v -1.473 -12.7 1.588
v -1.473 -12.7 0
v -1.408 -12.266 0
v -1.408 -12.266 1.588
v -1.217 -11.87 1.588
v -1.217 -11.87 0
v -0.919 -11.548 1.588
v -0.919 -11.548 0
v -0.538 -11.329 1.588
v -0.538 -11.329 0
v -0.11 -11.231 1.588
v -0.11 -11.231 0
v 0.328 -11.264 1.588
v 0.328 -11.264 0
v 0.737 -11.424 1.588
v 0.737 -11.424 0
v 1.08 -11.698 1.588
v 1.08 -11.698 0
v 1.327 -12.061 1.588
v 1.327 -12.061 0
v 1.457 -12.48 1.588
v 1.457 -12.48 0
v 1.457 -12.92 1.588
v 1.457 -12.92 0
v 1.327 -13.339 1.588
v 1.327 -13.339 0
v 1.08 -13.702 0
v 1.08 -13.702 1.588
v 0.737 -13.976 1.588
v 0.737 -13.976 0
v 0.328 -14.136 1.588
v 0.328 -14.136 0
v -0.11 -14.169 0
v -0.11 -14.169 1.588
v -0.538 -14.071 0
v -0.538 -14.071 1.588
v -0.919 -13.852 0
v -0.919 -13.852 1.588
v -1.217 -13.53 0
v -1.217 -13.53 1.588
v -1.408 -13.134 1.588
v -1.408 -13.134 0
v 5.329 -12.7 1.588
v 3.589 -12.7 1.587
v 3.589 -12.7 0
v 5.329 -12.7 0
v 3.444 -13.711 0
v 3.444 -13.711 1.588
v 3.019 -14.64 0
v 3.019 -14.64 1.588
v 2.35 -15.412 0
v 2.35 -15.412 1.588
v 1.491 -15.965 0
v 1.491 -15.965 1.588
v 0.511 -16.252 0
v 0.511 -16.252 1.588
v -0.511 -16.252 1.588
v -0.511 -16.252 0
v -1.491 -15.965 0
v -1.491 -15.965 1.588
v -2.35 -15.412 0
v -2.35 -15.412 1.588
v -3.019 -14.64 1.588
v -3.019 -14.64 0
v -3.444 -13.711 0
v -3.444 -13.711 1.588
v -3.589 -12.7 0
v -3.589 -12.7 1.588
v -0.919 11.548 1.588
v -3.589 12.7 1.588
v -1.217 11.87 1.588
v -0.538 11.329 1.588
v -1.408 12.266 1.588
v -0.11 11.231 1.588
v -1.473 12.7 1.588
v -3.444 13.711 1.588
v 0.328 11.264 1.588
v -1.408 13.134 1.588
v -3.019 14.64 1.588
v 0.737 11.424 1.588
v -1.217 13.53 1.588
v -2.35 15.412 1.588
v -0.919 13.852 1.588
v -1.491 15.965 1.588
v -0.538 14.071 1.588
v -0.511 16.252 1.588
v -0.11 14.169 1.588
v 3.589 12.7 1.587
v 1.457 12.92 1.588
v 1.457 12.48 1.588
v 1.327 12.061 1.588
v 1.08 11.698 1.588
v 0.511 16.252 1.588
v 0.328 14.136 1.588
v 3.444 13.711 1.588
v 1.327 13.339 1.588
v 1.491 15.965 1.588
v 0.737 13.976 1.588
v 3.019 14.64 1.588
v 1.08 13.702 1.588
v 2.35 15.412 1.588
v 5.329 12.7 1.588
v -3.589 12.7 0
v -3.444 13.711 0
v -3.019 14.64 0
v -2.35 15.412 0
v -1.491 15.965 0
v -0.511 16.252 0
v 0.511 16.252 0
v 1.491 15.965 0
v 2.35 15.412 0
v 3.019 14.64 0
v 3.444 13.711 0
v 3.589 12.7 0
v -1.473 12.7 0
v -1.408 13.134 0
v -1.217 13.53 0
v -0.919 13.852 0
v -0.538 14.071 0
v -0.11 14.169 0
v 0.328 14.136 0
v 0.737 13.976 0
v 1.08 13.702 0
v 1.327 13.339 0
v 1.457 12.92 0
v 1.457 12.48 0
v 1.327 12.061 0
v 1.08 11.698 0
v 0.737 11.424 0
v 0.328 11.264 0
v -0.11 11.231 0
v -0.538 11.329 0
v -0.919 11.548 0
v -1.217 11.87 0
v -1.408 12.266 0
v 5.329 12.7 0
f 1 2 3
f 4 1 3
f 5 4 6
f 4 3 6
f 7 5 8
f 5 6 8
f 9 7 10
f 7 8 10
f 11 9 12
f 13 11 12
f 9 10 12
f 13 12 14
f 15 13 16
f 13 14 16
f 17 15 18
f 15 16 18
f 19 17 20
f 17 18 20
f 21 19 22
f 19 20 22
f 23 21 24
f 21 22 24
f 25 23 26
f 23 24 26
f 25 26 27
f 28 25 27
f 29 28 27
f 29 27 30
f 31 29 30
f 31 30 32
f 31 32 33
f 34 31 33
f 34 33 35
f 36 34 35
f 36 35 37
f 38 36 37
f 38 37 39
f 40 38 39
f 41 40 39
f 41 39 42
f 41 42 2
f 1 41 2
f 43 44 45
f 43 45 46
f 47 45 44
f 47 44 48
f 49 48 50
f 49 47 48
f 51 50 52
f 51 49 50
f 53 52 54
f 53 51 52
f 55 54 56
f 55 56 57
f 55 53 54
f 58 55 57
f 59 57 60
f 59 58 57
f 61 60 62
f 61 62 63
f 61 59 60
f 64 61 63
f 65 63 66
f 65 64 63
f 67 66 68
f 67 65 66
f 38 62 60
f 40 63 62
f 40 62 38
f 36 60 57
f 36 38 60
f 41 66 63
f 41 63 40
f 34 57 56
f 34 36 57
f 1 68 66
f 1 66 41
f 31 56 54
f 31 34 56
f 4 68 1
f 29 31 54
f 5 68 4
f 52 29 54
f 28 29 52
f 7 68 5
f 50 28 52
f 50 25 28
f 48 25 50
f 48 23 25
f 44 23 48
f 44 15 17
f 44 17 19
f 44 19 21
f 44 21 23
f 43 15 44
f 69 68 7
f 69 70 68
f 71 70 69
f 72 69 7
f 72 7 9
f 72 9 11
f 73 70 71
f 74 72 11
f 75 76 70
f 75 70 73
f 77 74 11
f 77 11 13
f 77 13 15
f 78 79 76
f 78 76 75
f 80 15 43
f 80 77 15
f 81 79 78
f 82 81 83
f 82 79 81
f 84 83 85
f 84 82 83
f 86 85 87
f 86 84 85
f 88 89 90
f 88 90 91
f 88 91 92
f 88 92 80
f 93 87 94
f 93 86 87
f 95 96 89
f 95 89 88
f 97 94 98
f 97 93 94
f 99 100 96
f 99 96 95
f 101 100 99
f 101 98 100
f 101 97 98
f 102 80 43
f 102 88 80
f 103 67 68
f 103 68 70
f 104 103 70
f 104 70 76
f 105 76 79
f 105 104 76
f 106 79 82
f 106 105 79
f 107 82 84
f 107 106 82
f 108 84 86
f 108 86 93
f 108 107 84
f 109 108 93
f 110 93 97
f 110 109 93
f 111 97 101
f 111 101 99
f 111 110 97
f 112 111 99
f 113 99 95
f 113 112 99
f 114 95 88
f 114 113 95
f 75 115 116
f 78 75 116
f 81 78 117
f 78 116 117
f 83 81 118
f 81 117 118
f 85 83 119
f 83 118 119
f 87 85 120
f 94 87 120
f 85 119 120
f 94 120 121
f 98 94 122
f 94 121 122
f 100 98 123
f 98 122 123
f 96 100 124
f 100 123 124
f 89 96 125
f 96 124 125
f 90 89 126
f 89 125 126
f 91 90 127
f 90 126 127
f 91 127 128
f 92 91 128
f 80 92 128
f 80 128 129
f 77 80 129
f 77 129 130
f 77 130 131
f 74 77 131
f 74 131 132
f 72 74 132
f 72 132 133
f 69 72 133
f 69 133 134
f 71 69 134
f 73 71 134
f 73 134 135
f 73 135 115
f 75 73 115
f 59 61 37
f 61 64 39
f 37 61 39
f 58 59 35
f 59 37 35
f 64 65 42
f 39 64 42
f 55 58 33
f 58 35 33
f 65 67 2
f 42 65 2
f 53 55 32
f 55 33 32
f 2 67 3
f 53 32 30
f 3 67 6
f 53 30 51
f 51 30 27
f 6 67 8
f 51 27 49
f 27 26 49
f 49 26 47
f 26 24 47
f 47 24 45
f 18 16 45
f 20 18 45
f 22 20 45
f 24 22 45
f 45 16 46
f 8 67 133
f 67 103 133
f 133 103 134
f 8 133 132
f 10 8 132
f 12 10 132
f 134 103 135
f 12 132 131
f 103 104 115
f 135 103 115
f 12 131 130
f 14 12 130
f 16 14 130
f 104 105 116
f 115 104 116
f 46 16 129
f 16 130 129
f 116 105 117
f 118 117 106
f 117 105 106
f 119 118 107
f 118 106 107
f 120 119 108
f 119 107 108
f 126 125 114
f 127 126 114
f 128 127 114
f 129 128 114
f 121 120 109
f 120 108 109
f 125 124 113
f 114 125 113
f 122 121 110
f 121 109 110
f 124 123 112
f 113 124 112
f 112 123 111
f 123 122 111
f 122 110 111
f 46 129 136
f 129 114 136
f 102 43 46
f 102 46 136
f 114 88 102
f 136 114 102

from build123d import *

# Parameters (mm, degrees)
BOSS_EXTRUDE1_DEPTH       = 1.5875
F_4_CLEARANCE_HOLE1_D     = 2.9464
F_4_CLEARANCE_HOLE1_DEPTH = 3.302
F_4_CLEARANCE_HOLE1_TIP   = 0.885187864
SKETCH5_W                 = 1.7399
SKETCH5_H                 = 25.4
BOSS_EXTRUDE2_DEPTH       = 1.5875


with BuildPart() as part:
    # Sketch1 → Boss-Extrude1 (new body)
    with BuildSketch(Plane.XY):
        with BuildLine():
            Line((3.58902, 12.7), (3.58902, -12.7))
            ThreePointArc((3.58902, -12.7), (0, -16.28902), (-3.58902, -12.7))
            Line((-3.58902, -12.7), (-3.58902, 12.7))
            ThreePointArc((-3.58902, 12.7), (0, 16.28902), (3.58902, 12.7))
        make_face()
    extrude(amount=BOSS_EXTRUDE1_DEPTH)

    # #4 Clearance Hole1
    with Locations(Plane.XY.offset(1.5875)):
        with Locations((0, 12.7), (0, -12.7)):
            Hole(F_4_CLEARANCE_HOLE1_D / 2, depth=F_4_CLEARANCE_HOLE1_DEPTH)
            with Locations((0, 0, -(F_4_CLEARANCE_HOLE1_DEPTH + F_4_CLEARANCE_HOLE1_TIP / 2))):  # 118° drill point
                Cone(0, F_4_CLEARANCE_HOLE1_D / 2, F_4_CLEARANCE_HOLE1_TIP, mode=Mode.SUBTRACT)

    # Sketch5 → Boss-Extrude2 (add)
    with BuildSketch(Plane.XY.offset(1.5875)):
        with Locations((4.45897, 0)):
            Rectangle(SKETCH5_W, SKETCH5_H)
    extrude(amount=-BOSS_EXTRUDE2_DEPTH)


solid = part.part
